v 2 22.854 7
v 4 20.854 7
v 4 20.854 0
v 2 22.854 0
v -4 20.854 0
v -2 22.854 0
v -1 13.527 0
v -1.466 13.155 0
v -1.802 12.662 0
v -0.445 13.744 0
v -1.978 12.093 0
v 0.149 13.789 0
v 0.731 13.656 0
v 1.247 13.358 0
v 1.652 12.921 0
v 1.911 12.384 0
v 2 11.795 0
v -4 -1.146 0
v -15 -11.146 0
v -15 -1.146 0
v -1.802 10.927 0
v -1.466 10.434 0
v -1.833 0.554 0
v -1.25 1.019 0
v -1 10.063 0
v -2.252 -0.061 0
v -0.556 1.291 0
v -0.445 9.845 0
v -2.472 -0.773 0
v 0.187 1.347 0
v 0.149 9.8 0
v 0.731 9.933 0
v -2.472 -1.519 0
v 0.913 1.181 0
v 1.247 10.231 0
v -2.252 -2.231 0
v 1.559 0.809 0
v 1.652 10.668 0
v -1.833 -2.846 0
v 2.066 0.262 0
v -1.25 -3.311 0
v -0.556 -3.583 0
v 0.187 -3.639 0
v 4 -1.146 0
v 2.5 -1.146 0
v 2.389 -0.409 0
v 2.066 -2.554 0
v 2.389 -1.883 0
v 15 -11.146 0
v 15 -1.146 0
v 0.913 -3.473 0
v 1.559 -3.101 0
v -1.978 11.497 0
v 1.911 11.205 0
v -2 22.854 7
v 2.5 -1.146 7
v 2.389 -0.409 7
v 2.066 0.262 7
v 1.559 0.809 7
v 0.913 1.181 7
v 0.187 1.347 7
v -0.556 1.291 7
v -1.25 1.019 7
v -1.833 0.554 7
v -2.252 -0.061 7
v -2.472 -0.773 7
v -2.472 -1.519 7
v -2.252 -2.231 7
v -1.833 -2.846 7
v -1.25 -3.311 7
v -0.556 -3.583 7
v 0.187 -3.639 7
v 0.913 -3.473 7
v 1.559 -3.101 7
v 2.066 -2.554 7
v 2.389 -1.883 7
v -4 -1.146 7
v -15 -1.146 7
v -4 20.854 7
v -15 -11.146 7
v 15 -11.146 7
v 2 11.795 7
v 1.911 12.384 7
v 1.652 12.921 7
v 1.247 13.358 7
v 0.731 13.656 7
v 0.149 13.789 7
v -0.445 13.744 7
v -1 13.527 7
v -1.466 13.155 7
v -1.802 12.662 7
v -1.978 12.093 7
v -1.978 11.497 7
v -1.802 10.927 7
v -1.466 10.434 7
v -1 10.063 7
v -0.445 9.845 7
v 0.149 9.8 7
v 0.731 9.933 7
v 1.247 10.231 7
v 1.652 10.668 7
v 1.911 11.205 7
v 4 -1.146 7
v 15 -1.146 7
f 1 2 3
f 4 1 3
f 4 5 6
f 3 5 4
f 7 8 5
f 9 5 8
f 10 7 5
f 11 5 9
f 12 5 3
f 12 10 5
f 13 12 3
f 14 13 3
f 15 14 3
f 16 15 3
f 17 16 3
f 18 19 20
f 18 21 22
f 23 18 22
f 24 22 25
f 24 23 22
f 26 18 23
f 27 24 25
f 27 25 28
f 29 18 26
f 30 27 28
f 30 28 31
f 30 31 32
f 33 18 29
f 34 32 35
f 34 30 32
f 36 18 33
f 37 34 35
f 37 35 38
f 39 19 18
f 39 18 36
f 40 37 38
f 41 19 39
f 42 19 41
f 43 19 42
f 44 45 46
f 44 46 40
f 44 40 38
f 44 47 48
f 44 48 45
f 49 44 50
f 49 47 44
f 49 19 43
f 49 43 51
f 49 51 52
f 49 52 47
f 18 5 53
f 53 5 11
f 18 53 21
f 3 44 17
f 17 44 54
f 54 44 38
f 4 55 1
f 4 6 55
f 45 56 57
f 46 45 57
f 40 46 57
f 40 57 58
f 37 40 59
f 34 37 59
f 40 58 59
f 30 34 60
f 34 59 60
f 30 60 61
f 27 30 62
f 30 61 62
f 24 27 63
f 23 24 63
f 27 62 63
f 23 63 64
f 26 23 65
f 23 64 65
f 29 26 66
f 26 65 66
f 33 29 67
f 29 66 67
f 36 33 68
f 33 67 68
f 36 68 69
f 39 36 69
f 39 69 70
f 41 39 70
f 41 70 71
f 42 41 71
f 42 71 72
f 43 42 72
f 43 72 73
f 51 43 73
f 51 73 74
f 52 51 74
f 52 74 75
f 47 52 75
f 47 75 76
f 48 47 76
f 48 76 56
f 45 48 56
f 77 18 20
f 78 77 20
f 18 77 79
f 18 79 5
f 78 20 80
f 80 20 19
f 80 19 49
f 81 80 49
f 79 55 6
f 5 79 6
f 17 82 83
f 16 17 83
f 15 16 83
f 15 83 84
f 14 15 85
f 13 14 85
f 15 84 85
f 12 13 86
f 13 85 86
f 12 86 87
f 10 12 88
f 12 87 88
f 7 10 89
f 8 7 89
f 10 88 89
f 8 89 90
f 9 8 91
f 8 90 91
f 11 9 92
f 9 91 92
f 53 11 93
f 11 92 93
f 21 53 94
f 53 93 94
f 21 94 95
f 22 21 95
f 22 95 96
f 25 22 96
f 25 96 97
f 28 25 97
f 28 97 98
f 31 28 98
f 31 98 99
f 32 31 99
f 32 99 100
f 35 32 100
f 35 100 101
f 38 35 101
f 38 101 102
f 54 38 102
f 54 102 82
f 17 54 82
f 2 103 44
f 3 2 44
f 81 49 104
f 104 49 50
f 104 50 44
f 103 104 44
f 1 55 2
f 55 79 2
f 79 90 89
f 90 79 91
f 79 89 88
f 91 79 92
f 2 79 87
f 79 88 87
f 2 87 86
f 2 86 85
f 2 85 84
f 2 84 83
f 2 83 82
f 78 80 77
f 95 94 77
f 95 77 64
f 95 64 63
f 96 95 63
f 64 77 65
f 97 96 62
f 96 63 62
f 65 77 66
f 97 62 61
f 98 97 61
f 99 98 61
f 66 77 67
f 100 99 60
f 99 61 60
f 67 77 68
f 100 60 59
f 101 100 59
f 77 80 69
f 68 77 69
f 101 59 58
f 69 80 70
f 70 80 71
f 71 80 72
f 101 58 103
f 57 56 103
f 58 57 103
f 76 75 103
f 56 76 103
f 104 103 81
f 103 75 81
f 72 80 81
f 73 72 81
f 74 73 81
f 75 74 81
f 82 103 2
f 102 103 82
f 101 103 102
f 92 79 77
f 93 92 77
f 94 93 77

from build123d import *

# Parameters (mm, degrees)
EXTRUDE_1_DEPTH     = 7
SKETCH_3_W          = 8
SKETCH_3_H          = 7
EXTRUDE_3_DEPTH     = 13.5
SKETCH_2_R          = 2.5
SKETCH_2_R_2        = 1.999999991
CUT_EXTRUDE_2_DEPTH = 29.218856731
CHAMFER_1_SIZE      = 2


with BuildPart() as part:
    # Эскиз1 → Вытянуть1 (new body)
    with BuildSketch(Plane.XY):
        Polygon((-15, -1.146031522), (-15, -11.146031522), (15, -11.146031522), (15, -1.146031522), (4, -1.146031522), (4, 9.353968478), (-4, 9.353968478), (-4, -1.146031522), align=None)
    extrude(amount=EXTRUDE_1_DEPTH)

    # Эскиз3 → Вытянуть3 (add)
    with BuildSketch(Plane(origin=(0, 9.353968478, 0), x_dir=(1, 0, 0), z_dir=(0, 1, 0))):
        with Locations((0, -3.5)):
            Rectangle(SKETCH_3_W, SKETCH_3_H)
    extrude(amount=EXTRUDE_3_DEPTH)

    # Эскиз2 → Вытянуть2 (cut, through all)
    with BuildSketch(Plane.XY.offset(7)):
        with Locations((0, -1.14603177)):
            Circle(SKETCH_2_R)
        with Locations((4.2e-08, 11.794624395)):
            Circle(SKETCH_2_R_2)
    extrude(amount=-CUT_EXTRUDE_2_DEPTH, mode=Mode.SUBTRACT)

    # Фаска1
    chamfer_1_edges = [part.edges().sort_by_distance(p)[0] for p in [
        (4, 22.853968478, 3.5),
        (-4, 22.853968478, 3.5),
    ]]
    chamfer(chamfer_1_edges, length=CHAMFER_1_SIZE)


solid = part.part
